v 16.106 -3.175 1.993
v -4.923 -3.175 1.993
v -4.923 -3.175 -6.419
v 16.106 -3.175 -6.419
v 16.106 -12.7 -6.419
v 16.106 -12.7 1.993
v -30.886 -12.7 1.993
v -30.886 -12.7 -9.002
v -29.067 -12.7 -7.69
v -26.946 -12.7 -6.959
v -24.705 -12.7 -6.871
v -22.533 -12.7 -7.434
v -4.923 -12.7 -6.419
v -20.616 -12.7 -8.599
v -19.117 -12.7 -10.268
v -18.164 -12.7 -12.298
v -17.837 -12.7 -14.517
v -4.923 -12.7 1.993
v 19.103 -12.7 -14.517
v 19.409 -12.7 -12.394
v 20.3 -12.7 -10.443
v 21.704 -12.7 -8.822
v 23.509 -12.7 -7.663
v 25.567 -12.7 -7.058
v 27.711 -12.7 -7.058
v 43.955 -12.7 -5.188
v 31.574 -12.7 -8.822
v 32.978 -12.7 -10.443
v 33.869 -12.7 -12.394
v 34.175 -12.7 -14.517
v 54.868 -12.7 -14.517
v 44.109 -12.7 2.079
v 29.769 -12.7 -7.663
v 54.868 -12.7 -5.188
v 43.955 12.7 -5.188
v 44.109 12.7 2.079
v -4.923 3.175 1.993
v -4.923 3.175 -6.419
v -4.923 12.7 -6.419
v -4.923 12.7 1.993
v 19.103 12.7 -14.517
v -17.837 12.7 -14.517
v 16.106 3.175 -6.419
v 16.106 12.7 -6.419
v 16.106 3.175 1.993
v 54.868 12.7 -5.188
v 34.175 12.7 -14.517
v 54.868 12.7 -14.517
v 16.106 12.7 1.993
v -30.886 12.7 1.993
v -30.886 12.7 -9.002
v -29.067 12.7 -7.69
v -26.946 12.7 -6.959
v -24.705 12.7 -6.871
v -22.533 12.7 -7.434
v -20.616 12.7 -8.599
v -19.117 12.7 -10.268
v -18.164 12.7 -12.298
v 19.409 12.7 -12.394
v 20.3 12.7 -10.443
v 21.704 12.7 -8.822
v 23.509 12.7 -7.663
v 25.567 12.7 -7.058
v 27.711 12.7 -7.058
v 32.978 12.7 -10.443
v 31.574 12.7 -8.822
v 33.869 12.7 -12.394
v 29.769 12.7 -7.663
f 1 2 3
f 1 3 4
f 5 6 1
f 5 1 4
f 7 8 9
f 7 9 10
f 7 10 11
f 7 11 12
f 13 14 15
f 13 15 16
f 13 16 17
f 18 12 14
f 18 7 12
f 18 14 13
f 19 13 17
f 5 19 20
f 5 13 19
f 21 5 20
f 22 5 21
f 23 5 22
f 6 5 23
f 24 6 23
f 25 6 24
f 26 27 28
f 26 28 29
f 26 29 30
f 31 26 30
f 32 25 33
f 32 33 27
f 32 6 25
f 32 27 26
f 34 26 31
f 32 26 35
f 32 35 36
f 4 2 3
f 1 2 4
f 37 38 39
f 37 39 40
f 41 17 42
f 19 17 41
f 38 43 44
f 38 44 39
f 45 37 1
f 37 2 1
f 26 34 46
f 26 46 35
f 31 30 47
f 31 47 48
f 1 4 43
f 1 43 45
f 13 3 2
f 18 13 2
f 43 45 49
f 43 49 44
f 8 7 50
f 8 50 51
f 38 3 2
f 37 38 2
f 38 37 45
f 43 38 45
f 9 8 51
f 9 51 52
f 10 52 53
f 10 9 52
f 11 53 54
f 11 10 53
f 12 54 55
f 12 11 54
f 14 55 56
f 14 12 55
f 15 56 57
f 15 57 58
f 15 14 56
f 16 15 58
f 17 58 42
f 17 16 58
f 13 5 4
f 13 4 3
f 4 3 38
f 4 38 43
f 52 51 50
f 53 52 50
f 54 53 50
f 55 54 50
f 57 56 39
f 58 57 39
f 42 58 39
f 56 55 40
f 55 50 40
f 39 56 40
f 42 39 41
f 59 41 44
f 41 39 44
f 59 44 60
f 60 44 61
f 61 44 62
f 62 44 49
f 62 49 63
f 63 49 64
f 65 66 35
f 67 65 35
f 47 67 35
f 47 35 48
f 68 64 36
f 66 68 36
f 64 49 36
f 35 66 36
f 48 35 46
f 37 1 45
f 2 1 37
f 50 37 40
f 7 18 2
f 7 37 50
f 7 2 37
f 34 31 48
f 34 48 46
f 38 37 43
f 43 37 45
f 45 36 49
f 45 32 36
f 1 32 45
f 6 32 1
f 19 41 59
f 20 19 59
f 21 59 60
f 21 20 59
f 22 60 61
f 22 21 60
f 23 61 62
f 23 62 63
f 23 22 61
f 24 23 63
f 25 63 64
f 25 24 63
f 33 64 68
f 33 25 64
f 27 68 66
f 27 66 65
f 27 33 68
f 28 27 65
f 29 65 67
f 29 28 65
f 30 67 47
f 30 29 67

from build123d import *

# Parameters (mm, degrees)
F0_W     = 21.0292201075
F0_H     = 8.4116881791
F1_DEPTH = 3.175
F2_DEPTH = 12.7
F3_DEPTH = 12.7
F4_DEPTH = 12.7
F5_DEPTH = 3.175


# Not quite as in the source:
# - a length typed as a fraction of an inch, garbled in the dataset ("3 / 203.2 mm" for 3/8 in), is restored
# - the program builds the solid bodies; features that only make, move or delete a surface that nothing else refers to are left out


with BuildPart() as f1:
    # F0 (on Front) → F1 (new body, symmetric)
    with BuildSketch(Plane.XZ):
        with Locations((5.5916309617, -2.2130799996)):
            Rectangle(F0_W, F0_H)
        with BuildLine():
            Line((16.1062410154, -6.4189240892), (-4.9229790921, -6.4189240892))
            Line((-4.9229790921, -6.4189240892), (-4.9229790921, 1.9927640899))
            Line((-4.9229790921, 1.9927640899), (-22.6225737488, 1.9927640899))
            Line((-22.6225737488, 1.9927640899), (-30.8863221669, 1.9927640899))
            Line((-30.8863221669, 1.9927640899), (-30.8863221669, -9.0018421859))
            ThreePointArc((-30.8863221669, -9.0018421859), (-22.5331431268, -7.4335767863), (-17.836673191, -14.5172359101))
            Line((-17.836673191, -14.5172359101), (19.1034554321, -14.5172359101))
            ThreePointArc((19.1034554321, -14.5172359101), (26.6389876086, -6.9817037336), (34.174519785, -14.5172359101))
            Line((34.174519785, -14.5172359101), (48.1264702976, -14.5172359101))
            Line((48.1264702976, -14.5172359101), (54.8679456115, -14.5172359101))
            Line((54.8679456115, -14.5172359101), (54.8679456115, -5.1880707033))
            Line((54.8679456115, -5.1880707033), (43.9546283241, -5.1880707033))
            Line((43.9546283241, -5.1880707033), (44.1094860435, 2.0794970915))
            Line((44.1094860435, 2.0794970915), (16.1062410154, 1.9927640899))
            Line((16.1062410154, 1.9927640899), (16.1062410154, -6.4189240892))
        make_face()
    extrude(amount=F1_DEPTH, both=True)

    # F0 (on Front) → F2 (join, symmetric)
    with BuildSketch(Plane.XZ):
        with BuildLine():
            Line((16.1062410154, -6.4189240892), (-4.9229790921, -6.4189240892))
            Line((-4.9229790921, -6.4189240892), (-4.9229790921, 1.9927640899))
            Line((-4.9229790921, 1.9927640899), (-22.6225737488, 1.9927640899))
            Line((-22.6225737488, 1.9927640899), (-30.8863221669, 1.9927640899))
            Line((-30.8863221669, 1.9927640899), (-30.8863221669, -9.0018421859))
            ThreePointArc((-30.8863221669, -9.0018421859), (-22.5331431268, -7.4335767863), (-17.836673191, -14.5172359101))
            Line((-17.836673191, -14.5172359101), (19.1034554321, -14.5172359101))
            ThreePointArc((19.1034554321, -14.5172359101), (26.6389876086, -6.9817037336), (34.174519785, -14.5172359101))
            Line((34.174519785, -14.5172359101), (48.1264702976, -14.5172359101))
            Line((48.1264702976, -14.5172359101), (54.8679456115, -14.5172359101))
            Line((54.8679456115, -14.5172359101), (54.8679456115, -5.1880707033))
            Line((54.8679456115, -5.1880707033), (43.9546283241, -5.1880707033))
            Line((43.9546283241, -5.1880707033), (44.1094860435, 2.0794970915))
            Line((44.1094860435, 2.0794970915), (16.1062410154, 1.9927640899))
            Line((16.1062410154, 1.9927640899), (16.1062410154, -6.4189240892))
        make_face()
    extrude(amount=F2_DEPTH, both=True)

    # F0 (on Front) → F3 (join, symmetric)
    with BuildSketch(Plane.XZ):
        with BuildLine():
            Line((16.1062410154, -6.4189240892), (-4.9229790921, -6.4189240892))
            Line((-4.9229790921, -6.4189240892), (-4.9229790921, 1.9927640899))
            Line((-4.9229790921, 1.9927640899), (-22.6225737488, 1.9927640899))
            Line((-22.6225737488, 1.9927640899), (-30.8863221669, 1.9927640899))
            Line((-30.8863221669, 1.9927640899), (-30.8863221669, -9.0018421859))
            ThreePointArc((-30.8863221669, -9.0018421859), (-22.5331431268, -7.4335767863), (-17.836673191, -14.5172359101))
            Line((-17.836673191, -14.5172359101), (19.1034554321, -14.5172359101))
            ThreePointArc((19.1034554321, -14.5172359101), (26.6389876086, -6.9817037336), (34.174519785, -14.5172359101))
            Line((34.174519785, -14.5172359101), (48.1264702976, -14.5172359101))
            Line((48.1264702976, -14.5172359101), (54.8679456115, -14.5172359101))
            Line((54.8679456115, -14.5172359101), (54.8679456115, -5.1880707033))
            Line((54.8679456115, -5.1880707033), (43.9546283241, -5.1880707033))
            Line((43.9546283241, -5.1880707033), (44.1094860435, 2.0794970915))
            Line((44.1094860435, 2.0794970915), (16.1062410154, 1.9927640899))
            Line((16.1062410154, 1.9927640899), (16.1062410154, -6.4189240892))
        make_face()
    extrude(amount=F3_DEPTH, both=True)

    # F0 (on Front) → F4 (join, symmetric)
    with BuildSketch(Plane.XZ):
        with BuildLine():
            Line((16.1062410154, -6.4189240892), (-4.9229790921, -6.4189240892))
            Line((-4.9229790921, -6.4189240892), (-4.9229790921, 1.9927640899))
            Line((-4.9229790921, 1.9927640899), (-22.6225737488, 1.9927640899))
            Line((-22.6225737488, 1.9927640899), (-30.8863221669, 1.9927640899))
            Line((-30.8863221669, 1.9927640899), (-30.8863221669, -9.0018421859))
            ThreePointArc((-30.8863221669, -9.0018421859), (-22.5331431268, -7.4335767863), (-17.836673191, -14.5172359101))
            Line((-17.836673191, -14.5172359101), (19.1034554321, -14.5172359101))
            ThreePointArc((19.1034554321, -14.5172359101), (26.6389876086, -6.9817037336), (34.174519785, -14.5172359101))
            Line((34.174519785, -14.5172359101), (48.1264702976, -14.5172359101))
            Line((48.1264702976, -14.5172359101), (54.8679456115, -14.5172359101))
            Line((54.8679456115, -14.5172359101), (54.8679456115, -5.1880707033))
            Line((54.8679456115, -5.1880707033), (43.9546283241, -5.1880707033))
            Line((43.9546283241, -5.1880707033), (44.1094860435, 2.0794970915))
            Line((44.1094860435, 2.0794970915), (16.1062410154, 1.9927640899))
            Line((16.1062410154, 1.9927640899), (16.1062410154, -6.4189240892))
        make_face()
    extrude(amount=F4_DEPTH, both=True)


with BuildPart() as f5:
    # F0 (on Front) → F5 (new body, symmetric)
    with BuildSketch(Plane.XZ):
        with Locations((5.5916309617, -2.2130799996)):
            Rectangle(F0_W, F0_H)
    extrude(amount=F5_DEPTH, both=True)


solid = Compound([f1.part, f5.part])
